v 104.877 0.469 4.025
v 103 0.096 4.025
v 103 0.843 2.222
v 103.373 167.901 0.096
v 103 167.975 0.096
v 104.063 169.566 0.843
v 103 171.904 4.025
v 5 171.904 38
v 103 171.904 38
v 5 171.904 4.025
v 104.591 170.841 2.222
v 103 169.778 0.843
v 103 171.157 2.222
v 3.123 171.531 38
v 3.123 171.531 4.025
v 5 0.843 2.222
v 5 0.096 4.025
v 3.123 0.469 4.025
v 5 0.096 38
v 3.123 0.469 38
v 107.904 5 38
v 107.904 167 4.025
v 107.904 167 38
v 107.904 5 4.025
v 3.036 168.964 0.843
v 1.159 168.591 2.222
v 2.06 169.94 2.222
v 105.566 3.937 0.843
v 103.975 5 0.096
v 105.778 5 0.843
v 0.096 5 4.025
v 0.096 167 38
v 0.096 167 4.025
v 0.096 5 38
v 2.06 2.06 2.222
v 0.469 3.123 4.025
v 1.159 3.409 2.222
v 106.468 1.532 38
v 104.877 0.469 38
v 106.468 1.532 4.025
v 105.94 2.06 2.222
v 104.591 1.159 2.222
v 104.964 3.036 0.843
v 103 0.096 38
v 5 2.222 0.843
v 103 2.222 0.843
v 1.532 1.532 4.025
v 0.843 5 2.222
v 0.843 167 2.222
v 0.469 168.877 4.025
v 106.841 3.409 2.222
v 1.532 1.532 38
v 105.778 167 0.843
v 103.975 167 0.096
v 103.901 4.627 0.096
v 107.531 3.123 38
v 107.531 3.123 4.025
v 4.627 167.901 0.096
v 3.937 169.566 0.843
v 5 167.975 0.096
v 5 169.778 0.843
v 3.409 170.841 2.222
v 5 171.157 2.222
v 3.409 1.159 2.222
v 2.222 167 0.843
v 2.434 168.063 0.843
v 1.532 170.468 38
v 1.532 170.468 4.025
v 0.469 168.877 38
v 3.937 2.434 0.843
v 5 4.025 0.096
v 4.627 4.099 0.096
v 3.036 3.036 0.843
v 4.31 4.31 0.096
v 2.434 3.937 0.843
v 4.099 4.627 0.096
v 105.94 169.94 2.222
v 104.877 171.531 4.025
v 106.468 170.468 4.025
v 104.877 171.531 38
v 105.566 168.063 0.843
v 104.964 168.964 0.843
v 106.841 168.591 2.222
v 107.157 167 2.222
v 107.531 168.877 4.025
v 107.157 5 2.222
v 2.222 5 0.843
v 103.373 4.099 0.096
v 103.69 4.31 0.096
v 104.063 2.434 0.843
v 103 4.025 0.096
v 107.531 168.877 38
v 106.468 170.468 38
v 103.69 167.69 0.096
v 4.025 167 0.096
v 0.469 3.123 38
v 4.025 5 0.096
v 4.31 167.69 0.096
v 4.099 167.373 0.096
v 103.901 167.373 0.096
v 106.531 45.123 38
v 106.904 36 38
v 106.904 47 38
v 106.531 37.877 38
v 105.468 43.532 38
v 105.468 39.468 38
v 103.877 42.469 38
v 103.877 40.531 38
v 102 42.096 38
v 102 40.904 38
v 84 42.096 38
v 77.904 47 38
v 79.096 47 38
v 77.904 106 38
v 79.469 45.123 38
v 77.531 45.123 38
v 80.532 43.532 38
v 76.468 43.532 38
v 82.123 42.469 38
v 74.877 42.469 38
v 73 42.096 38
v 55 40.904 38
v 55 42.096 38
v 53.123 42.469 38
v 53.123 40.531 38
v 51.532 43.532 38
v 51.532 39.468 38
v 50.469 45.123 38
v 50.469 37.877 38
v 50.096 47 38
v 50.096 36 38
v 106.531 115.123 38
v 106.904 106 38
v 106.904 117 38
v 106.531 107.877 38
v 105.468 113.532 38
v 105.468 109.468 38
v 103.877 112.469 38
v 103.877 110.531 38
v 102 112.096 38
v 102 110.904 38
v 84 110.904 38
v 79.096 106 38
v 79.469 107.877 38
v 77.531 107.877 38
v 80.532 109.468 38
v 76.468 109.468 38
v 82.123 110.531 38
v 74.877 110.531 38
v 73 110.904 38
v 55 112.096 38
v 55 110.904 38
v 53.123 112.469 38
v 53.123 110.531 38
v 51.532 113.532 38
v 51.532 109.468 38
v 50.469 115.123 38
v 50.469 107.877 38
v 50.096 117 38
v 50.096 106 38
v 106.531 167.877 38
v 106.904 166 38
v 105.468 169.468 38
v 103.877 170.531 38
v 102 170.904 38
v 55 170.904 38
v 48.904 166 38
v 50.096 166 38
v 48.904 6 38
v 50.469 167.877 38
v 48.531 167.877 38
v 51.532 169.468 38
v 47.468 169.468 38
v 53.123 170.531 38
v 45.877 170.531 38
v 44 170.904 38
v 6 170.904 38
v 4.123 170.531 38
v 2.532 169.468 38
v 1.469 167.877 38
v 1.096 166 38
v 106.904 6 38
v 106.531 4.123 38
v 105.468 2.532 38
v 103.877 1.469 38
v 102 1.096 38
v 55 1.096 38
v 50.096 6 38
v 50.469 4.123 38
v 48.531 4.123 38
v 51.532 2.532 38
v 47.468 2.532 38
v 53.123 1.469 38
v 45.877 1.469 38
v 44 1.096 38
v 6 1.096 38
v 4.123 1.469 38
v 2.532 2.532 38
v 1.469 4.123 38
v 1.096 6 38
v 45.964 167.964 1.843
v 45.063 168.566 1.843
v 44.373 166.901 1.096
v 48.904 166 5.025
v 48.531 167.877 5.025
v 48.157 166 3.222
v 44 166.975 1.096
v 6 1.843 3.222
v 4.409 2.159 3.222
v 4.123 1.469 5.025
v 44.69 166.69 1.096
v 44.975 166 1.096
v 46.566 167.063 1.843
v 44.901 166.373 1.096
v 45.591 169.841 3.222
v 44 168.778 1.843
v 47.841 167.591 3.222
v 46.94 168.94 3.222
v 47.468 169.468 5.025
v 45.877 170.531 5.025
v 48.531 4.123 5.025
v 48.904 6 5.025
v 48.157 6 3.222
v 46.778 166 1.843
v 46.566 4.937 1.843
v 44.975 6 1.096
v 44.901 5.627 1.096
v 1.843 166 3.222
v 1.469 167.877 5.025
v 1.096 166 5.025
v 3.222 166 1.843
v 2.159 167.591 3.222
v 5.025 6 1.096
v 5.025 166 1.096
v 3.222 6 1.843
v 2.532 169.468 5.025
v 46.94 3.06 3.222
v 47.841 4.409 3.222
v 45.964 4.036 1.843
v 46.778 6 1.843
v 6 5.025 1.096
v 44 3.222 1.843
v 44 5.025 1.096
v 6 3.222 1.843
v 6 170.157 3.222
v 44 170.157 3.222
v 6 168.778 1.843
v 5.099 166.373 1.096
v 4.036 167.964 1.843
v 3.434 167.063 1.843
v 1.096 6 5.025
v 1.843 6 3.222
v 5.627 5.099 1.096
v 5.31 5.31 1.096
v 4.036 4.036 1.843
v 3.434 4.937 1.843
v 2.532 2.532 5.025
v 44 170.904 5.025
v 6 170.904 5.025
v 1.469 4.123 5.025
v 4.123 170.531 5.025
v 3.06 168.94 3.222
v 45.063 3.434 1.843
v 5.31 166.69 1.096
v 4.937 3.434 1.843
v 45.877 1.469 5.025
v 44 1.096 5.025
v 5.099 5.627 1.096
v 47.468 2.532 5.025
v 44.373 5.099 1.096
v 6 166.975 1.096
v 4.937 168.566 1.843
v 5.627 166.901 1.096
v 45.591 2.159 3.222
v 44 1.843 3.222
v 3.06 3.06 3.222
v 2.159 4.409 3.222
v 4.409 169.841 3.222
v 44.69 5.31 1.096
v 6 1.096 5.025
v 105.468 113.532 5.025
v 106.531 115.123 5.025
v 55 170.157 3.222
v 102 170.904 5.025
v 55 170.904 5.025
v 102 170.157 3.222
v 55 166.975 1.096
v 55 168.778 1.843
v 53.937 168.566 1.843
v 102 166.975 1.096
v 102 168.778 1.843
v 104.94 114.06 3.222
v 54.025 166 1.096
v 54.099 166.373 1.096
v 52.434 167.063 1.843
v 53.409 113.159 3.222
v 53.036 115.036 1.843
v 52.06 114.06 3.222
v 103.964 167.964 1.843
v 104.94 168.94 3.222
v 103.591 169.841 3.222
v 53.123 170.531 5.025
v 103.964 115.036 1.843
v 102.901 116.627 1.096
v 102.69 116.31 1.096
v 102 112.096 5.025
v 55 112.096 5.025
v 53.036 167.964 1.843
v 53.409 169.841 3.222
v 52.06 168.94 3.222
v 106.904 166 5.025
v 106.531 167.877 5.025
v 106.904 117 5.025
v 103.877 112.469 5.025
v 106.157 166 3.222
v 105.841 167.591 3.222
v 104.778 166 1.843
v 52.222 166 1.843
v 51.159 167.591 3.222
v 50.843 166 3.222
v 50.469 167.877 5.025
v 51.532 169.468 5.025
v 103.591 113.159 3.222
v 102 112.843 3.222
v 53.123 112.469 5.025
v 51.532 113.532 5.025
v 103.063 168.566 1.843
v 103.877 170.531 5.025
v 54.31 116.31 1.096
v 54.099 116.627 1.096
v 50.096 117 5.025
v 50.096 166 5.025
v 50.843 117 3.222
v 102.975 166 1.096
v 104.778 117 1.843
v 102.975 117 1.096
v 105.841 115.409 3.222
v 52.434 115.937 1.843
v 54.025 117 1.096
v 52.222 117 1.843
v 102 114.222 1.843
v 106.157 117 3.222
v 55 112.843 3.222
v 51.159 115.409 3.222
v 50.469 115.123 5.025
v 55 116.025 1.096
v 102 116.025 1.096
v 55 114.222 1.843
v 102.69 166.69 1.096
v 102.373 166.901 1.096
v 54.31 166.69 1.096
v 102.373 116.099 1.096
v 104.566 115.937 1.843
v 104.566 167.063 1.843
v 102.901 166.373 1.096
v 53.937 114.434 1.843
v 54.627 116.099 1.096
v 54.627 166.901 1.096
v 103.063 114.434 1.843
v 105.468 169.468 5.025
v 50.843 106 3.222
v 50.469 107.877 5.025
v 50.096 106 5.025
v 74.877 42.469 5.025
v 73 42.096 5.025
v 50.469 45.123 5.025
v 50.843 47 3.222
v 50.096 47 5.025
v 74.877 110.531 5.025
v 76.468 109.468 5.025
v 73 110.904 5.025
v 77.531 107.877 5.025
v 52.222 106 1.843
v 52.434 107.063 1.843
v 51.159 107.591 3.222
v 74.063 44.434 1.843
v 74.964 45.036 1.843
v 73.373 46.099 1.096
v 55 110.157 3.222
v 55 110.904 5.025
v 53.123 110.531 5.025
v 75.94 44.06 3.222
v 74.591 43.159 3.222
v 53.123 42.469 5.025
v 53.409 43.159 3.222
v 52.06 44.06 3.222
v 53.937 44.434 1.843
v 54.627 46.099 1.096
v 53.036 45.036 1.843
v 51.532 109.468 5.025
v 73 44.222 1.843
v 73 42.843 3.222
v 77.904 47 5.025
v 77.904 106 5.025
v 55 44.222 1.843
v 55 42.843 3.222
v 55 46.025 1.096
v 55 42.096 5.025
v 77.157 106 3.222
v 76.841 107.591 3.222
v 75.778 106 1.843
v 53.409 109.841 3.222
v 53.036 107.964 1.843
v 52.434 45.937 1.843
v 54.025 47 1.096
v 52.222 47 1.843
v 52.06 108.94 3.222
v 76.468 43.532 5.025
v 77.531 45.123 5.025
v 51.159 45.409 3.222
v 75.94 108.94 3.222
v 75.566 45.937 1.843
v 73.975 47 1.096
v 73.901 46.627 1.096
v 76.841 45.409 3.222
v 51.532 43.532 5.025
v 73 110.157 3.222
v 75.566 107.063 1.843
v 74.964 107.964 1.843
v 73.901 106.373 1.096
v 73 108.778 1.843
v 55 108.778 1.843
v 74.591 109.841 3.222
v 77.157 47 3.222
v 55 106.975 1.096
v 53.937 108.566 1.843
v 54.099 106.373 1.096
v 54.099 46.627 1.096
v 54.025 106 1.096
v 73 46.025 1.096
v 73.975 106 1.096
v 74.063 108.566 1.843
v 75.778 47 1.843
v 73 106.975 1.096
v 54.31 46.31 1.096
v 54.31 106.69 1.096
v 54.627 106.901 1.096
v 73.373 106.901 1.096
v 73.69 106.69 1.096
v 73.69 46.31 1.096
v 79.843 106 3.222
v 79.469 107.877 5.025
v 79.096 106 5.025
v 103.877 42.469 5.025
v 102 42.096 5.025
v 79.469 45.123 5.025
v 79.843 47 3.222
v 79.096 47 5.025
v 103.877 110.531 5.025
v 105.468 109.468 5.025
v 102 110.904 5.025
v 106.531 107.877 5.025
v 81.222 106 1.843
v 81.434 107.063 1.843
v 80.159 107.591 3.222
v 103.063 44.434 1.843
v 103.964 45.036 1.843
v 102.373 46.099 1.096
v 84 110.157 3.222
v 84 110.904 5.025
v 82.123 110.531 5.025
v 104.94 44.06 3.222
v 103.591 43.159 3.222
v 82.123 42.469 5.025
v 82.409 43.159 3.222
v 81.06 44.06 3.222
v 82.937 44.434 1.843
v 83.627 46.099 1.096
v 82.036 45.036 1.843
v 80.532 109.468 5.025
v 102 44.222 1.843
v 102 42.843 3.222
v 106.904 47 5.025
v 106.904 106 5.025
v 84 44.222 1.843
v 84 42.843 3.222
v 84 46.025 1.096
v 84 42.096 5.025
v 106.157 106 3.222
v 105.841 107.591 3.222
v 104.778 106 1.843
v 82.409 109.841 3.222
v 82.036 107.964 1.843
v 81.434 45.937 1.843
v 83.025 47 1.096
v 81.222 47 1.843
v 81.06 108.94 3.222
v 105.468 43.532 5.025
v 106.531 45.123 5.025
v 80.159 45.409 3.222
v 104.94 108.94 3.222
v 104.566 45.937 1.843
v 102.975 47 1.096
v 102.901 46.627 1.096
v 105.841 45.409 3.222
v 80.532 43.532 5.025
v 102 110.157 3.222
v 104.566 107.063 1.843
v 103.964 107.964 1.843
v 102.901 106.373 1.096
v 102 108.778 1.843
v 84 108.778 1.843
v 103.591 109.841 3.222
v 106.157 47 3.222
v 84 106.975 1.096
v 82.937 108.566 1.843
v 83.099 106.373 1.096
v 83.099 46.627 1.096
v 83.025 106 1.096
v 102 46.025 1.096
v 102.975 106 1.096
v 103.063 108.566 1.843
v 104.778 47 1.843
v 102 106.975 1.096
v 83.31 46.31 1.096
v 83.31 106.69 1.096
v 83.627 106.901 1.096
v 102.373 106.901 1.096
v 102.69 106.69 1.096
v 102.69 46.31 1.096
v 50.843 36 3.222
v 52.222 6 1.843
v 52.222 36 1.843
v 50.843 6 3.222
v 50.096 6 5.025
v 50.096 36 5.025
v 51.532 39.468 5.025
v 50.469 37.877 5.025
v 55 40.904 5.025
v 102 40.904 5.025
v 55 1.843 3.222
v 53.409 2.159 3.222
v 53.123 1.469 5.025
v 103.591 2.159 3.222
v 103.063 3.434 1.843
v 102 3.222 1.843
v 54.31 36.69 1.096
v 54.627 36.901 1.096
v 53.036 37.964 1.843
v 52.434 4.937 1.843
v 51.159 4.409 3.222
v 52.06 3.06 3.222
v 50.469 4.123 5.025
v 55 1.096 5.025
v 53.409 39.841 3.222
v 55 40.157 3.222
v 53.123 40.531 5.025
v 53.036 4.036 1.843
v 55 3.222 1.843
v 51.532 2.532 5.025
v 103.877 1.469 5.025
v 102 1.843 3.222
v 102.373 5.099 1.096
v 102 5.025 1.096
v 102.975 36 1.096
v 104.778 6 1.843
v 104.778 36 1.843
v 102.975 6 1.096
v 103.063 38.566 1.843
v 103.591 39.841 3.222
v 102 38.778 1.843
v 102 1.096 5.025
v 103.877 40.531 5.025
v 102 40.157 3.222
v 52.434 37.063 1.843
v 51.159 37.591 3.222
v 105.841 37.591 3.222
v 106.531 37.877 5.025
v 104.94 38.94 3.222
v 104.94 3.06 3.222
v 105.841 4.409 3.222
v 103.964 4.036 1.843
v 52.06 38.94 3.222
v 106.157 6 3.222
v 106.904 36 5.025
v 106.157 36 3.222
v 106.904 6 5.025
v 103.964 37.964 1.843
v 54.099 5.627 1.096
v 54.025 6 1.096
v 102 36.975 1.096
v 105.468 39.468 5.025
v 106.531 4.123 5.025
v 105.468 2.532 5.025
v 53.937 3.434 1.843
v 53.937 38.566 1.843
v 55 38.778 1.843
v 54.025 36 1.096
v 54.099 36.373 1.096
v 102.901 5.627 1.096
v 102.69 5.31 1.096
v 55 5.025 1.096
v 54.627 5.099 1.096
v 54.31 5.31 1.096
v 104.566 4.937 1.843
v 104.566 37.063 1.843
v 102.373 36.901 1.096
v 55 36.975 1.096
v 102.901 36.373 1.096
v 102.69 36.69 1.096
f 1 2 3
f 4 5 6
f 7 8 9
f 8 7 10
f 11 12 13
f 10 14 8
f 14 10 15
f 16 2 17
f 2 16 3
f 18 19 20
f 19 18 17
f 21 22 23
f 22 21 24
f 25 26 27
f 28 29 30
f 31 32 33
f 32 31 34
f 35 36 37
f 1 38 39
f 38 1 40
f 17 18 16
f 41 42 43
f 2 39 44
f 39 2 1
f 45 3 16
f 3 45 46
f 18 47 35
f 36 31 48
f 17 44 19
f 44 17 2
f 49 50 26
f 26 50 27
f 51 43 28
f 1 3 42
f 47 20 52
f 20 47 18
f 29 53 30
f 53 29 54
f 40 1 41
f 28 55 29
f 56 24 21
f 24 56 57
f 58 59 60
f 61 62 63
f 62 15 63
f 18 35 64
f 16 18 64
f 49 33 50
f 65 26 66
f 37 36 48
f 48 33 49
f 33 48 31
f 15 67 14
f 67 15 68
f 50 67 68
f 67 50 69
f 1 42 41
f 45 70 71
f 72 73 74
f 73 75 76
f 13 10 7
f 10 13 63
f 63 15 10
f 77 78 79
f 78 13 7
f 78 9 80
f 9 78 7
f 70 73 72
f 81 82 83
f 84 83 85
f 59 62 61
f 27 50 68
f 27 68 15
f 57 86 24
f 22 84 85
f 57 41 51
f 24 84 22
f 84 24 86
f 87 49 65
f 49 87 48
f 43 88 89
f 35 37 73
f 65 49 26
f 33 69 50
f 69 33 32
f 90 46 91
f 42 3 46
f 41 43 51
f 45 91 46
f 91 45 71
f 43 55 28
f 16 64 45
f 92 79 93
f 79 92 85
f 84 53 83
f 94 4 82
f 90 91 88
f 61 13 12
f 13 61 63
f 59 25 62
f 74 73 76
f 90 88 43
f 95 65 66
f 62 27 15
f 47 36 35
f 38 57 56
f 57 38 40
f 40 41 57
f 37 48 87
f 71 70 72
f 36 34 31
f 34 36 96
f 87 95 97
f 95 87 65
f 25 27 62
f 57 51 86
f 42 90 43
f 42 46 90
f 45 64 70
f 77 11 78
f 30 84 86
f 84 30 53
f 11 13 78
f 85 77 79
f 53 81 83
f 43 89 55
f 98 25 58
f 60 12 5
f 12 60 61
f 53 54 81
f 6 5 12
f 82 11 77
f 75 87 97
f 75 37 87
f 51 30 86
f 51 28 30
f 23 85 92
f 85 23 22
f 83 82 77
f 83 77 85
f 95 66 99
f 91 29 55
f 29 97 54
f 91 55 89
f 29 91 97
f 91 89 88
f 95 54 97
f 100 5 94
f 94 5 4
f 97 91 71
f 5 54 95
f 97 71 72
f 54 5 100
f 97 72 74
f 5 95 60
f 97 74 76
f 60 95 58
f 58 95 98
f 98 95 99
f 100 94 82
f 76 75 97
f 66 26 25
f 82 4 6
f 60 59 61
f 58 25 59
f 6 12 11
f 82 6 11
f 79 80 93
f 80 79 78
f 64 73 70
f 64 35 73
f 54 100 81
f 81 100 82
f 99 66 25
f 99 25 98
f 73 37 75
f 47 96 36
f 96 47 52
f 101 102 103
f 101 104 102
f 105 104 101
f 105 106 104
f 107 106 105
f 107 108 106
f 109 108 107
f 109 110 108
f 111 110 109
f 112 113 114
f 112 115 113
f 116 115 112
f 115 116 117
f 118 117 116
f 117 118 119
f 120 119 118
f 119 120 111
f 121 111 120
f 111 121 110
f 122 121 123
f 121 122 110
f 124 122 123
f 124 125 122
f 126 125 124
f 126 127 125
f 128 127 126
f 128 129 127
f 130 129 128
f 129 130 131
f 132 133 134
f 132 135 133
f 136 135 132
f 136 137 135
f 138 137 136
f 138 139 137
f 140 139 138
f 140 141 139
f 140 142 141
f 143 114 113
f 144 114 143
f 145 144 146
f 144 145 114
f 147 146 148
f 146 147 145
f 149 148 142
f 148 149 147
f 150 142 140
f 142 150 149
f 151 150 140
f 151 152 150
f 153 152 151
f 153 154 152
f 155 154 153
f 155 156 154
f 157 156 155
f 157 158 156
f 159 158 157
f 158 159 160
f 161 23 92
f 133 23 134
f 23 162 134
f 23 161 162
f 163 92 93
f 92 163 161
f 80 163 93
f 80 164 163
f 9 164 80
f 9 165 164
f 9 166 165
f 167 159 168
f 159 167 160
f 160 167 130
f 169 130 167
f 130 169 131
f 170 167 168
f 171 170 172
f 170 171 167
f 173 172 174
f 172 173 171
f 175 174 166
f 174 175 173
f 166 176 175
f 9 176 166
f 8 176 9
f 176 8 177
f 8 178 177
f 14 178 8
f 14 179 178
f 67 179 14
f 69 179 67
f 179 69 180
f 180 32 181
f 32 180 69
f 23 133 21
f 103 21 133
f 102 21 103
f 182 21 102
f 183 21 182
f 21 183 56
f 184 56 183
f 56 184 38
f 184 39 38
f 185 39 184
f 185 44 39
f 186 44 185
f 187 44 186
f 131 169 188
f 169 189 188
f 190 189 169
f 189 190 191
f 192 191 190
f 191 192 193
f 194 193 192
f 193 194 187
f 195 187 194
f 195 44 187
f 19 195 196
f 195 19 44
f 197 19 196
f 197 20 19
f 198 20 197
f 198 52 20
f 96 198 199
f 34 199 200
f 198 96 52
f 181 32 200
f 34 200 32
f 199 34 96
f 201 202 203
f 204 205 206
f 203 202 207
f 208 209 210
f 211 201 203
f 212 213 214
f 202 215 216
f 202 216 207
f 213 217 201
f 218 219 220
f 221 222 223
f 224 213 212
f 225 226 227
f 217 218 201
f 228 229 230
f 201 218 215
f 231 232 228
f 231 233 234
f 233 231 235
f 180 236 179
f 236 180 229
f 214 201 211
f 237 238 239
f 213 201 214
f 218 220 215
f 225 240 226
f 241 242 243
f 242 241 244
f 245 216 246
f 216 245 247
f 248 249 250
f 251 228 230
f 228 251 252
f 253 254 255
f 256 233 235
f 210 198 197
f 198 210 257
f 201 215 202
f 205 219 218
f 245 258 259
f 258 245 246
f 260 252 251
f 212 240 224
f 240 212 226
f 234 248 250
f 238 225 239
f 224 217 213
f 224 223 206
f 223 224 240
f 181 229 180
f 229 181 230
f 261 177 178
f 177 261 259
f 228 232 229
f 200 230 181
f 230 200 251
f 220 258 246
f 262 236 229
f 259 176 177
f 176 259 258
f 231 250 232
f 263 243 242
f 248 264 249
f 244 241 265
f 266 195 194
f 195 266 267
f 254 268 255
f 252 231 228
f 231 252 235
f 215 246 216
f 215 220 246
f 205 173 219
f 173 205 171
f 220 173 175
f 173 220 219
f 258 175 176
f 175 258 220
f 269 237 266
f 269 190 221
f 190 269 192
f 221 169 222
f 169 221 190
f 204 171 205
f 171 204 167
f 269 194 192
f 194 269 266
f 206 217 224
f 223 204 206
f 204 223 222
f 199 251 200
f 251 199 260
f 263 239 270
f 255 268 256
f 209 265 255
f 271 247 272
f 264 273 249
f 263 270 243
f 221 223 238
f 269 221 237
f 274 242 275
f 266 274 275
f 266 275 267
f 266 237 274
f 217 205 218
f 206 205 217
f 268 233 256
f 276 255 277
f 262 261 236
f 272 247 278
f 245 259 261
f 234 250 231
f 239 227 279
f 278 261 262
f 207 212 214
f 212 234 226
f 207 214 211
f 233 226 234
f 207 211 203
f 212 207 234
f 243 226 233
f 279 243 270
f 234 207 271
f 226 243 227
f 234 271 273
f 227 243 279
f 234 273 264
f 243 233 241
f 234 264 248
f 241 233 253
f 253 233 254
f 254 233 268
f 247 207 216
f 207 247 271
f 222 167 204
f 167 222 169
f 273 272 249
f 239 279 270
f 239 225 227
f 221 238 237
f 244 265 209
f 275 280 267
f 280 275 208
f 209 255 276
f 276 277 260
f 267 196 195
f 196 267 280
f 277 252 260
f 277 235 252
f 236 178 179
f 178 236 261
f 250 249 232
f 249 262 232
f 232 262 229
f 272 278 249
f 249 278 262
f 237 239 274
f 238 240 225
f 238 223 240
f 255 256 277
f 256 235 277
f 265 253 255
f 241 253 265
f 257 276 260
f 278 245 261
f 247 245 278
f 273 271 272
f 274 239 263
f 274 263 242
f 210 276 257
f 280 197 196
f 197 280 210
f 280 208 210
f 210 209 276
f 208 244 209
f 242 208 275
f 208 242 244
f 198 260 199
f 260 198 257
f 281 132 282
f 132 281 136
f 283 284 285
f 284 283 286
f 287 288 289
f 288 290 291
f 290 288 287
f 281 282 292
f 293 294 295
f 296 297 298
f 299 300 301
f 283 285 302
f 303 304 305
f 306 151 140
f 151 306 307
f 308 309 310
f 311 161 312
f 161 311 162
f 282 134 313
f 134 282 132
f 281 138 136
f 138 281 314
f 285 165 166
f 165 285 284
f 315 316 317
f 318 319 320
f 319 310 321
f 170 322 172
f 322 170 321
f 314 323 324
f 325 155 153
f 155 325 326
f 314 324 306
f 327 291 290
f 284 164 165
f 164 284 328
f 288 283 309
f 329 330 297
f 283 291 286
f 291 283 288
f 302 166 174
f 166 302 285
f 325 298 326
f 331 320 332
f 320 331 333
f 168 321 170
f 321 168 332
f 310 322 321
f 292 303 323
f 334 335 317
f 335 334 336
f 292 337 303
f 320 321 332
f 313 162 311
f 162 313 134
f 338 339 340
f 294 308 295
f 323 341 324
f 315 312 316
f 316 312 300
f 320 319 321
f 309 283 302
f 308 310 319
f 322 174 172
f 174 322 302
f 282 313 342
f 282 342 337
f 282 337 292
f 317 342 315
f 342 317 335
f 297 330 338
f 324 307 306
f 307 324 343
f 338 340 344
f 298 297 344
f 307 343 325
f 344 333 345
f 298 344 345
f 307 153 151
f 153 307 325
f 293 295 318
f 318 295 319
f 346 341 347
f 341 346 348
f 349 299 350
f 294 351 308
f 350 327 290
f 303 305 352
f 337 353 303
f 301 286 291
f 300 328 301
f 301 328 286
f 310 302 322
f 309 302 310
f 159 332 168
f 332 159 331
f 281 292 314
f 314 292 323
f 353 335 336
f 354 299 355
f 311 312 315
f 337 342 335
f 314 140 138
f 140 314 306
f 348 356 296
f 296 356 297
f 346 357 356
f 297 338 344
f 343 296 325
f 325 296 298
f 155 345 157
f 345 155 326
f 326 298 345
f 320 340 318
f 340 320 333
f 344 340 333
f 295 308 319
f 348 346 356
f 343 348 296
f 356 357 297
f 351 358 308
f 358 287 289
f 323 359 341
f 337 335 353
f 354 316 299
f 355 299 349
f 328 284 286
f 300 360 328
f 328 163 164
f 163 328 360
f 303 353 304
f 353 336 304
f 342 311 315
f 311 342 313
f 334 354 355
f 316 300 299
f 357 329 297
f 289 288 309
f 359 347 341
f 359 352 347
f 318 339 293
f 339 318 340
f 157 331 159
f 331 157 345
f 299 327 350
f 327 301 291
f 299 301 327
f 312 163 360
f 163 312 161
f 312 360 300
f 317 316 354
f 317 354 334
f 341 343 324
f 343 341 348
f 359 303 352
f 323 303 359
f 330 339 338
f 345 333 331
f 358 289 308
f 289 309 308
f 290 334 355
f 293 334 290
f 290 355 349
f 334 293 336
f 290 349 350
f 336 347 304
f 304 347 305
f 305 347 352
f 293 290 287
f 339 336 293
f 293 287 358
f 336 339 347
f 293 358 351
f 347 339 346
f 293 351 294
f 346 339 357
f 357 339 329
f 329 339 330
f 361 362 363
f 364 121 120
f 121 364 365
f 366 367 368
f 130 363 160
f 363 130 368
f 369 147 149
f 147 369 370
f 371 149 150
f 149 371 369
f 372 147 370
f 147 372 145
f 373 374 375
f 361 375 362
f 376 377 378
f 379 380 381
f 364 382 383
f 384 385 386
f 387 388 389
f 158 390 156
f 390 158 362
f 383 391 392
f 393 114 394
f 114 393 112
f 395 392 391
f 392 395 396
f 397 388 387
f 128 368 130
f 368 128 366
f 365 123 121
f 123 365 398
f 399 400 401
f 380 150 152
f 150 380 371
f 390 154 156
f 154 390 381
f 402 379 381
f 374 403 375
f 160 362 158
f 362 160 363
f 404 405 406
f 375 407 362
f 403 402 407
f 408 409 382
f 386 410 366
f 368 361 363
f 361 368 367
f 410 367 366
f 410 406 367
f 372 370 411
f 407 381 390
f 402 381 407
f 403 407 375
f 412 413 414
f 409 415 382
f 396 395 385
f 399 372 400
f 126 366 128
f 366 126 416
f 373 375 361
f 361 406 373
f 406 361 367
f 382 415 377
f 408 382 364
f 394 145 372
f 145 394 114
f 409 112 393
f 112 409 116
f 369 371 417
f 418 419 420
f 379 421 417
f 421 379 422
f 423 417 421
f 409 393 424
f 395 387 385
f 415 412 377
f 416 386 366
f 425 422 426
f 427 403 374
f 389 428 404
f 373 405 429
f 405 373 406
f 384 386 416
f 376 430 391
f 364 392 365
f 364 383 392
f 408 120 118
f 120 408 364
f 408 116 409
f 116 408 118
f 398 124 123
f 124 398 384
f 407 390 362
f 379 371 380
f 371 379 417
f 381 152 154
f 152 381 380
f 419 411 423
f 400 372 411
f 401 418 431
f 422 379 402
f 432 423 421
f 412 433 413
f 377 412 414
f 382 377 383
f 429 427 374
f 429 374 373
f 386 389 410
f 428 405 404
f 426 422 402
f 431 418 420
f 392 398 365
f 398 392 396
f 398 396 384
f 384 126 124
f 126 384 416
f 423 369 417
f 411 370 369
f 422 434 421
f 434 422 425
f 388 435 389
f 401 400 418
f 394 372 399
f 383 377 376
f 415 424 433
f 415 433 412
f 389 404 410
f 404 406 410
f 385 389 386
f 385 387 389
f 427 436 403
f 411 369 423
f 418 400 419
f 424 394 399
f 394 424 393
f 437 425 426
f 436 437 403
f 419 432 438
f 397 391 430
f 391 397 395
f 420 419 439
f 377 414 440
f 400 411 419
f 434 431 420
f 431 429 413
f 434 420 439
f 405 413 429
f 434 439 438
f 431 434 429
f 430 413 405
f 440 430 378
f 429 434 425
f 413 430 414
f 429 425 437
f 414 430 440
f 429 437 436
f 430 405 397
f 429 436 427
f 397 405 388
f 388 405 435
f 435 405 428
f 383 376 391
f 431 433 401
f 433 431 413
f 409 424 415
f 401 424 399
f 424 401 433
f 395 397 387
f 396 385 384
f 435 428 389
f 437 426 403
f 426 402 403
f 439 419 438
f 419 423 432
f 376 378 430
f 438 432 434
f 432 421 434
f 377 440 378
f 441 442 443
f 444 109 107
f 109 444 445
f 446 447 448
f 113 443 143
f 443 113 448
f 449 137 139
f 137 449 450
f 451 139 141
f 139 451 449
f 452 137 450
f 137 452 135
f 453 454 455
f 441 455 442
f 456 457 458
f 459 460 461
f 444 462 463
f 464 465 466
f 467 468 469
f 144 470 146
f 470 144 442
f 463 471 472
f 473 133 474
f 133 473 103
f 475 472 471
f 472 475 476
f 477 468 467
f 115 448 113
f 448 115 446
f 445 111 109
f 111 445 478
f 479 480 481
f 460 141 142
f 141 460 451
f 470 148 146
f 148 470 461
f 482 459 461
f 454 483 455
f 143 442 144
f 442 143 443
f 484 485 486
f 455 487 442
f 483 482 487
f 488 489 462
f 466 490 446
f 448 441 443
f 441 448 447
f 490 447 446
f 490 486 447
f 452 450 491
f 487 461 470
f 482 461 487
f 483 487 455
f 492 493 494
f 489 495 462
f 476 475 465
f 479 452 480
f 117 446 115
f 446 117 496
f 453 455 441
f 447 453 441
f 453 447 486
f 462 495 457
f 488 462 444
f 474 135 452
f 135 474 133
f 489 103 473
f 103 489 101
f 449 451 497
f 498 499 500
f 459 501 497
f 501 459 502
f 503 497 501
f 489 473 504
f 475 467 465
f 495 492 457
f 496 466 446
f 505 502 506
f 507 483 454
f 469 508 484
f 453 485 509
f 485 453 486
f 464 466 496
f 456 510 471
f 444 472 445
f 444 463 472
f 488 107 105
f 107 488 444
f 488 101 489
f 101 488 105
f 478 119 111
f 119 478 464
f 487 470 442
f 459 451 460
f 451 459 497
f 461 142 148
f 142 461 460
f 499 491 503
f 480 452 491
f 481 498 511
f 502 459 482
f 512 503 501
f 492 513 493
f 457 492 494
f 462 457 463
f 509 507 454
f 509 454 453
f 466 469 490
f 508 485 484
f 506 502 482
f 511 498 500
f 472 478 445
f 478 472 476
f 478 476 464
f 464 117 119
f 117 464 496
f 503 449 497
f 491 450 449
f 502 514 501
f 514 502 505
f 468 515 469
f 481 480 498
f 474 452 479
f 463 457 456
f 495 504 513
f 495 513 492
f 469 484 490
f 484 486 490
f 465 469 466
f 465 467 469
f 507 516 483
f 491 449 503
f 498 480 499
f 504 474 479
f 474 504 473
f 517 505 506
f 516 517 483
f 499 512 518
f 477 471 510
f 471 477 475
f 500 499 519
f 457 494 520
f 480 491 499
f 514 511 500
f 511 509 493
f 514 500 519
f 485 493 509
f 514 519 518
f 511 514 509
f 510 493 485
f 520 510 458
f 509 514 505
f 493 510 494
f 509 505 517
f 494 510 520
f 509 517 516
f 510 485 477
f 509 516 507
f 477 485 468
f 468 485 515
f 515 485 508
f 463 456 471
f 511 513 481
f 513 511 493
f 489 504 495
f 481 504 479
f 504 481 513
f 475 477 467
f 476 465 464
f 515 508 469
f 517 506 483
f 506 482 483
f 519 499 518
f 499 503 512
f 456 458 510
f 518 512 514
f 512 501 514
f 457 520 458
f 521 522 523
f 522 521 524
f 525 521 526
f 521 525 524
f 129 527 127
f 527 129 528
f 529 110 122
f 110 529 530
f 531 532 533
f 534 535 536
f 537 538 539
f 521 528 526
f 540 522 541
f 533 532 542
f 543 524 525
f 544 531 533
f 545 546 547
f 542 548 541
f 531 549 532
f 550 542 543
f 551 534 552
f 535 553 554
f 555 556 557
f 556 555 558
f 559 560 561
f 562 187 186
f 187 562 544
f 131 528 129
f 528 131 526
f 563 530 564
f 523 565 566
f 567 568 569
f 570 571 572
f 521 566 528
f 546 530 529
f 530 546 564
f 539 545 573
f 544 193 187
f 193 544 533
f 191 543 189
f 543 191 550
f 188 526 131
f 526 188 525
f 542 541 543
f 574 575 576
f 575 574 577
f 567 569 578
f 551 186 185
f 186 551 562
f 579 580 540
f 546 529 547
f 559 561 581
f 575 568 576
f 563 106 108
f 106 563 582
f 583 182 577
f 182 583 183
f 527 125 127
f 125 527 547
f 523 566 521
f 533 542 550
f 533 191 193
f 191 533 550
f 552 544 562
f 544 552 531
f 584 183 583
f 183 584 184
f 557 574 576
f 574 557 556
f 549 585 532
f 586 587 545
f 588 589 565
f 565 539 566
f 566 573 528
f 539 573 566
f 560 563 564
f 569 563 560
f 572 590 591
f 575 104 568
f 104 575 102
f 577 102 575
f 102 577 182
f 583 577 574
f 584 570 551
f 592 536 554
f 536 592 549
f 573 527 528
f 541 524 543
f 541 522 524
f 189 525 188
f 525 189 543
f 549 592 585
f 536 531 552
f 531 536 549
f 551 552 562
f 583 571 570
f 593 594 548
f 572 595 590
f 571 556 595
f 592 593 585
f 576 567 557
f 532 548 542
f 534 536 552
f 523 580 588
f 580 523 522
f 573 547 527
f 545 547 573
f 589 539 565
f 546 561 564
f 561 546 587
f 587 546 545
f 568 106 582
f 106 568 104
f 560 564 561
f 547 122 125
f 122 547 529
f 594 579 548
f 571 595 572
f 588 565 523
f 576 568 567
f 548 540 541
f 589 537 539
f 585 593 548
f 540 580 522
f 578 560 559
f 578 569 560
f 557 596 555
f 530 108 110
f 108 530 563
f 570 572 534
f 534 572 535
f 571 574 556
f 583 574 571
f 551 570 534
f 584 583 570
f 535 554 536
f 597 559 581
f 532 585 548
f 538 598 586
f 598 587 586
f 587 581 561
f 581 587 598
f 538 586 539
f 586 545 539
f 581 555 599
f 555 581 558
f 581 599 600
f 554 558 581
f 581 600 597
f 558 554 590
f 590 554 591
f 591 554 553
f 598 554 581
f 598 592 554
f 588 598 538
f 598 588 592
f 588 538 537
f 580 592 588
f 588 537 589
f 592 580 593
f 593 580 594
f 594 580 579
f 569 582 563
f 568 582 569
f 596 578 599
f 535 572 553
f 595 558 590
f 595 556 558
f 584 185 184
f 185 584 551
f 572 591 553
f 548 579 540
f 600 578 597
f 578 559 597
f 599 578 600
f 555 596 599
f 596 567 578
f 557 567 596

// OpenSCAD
//width 108  length 172
//main and sharps, 50 or so by whole length
//alligators and forks, Right side remaining 58 x 60long

radius = 5;
width = 108;
length = 172;
height = 38;
wall = 1;

// +----+-------+
// | 1  | 2     |
// |    |       |
// |    +-------+
// |    | 3 | 4 |
// |    |   |   |
// |    |-------+
// |    | 5     |
// |    |       |
// +----+-------+

leads_and_sharps_width = 48; // 1
leads_and_sharps_length = 170;
alligators_and_forks_width = 57; // 2
alligators_and_forks_length = 59;
l_clamps_width = 28; // 3
l_clamps_length = 69;
thermistor_width = 28; // 4
thermistor_length = 69;
tiny_clamps_width = 57; // 5
tiny_clamps_length = 40;

module box() {
  difference() {
    round_bottom_box(width,length,height,radius);
    leads_and_sharps();
    alligators_and_forks();
    l_clamps();
    thermistor();
    tiny_clamps();
  }
}

module leads_and_sharps() {
  translate([wall,wall,wall]) {
    round_bottom_box(leads_and_sharps_width,leads_and_sharps_length,height,radius);
  }
}

module alligators_and_forks() {
  translate([wall + leads_and_sharps_width + wall, wall + tiny_clamps_length + wall + thermistor_length + wall, wall])
    round_bottom_box(alligators_and_forks_width, alligators_and_forks_length, height, radius);
}

module l_clamps() {
  translate([wall + leads_and_sharps_width + wall, wall + tiny_clamps_length + wall, wall])
    round_bottom_box(l_clamps_width, l_clamps_length, height, radius);
}

module thermistor() {
  translate([wall + leads_and_sharps_width + wall + l_clamps_width + wall, wall + tiny_clamps_length + wall, wall])
    round_bottom_box(thermistor_width, thermistor_length, height, radius);
}

module tiny_clamps() {
  translate([wall + leads_and_sharps_width + wall, wall, wall])
    round_bottom_box(tiny_clamps_width, tiny_clamps_length, height, radius);
}

module spheres(width,length,height,radius) {
  translate([radius,radius,radius]) sphere(radius);
  translate([width-radius, length-radius, radius]) sphere(radius);
  translate([width-radius, radius, radius]) sphere(radius);
  translate([radius, length-radius, radius]) sphere(radius);
}

module slicer() {
  translate([0,0,height]) cube([width, length, height]); 
}

module round_bottom_box(width, length, height,radius) {
  difference() {
    hull() {
      spheres(width,length,height,radius);
      translate([0,0,height]) spheres(width,length,height,radius);
    }
    slicer();
  }
}

box();
